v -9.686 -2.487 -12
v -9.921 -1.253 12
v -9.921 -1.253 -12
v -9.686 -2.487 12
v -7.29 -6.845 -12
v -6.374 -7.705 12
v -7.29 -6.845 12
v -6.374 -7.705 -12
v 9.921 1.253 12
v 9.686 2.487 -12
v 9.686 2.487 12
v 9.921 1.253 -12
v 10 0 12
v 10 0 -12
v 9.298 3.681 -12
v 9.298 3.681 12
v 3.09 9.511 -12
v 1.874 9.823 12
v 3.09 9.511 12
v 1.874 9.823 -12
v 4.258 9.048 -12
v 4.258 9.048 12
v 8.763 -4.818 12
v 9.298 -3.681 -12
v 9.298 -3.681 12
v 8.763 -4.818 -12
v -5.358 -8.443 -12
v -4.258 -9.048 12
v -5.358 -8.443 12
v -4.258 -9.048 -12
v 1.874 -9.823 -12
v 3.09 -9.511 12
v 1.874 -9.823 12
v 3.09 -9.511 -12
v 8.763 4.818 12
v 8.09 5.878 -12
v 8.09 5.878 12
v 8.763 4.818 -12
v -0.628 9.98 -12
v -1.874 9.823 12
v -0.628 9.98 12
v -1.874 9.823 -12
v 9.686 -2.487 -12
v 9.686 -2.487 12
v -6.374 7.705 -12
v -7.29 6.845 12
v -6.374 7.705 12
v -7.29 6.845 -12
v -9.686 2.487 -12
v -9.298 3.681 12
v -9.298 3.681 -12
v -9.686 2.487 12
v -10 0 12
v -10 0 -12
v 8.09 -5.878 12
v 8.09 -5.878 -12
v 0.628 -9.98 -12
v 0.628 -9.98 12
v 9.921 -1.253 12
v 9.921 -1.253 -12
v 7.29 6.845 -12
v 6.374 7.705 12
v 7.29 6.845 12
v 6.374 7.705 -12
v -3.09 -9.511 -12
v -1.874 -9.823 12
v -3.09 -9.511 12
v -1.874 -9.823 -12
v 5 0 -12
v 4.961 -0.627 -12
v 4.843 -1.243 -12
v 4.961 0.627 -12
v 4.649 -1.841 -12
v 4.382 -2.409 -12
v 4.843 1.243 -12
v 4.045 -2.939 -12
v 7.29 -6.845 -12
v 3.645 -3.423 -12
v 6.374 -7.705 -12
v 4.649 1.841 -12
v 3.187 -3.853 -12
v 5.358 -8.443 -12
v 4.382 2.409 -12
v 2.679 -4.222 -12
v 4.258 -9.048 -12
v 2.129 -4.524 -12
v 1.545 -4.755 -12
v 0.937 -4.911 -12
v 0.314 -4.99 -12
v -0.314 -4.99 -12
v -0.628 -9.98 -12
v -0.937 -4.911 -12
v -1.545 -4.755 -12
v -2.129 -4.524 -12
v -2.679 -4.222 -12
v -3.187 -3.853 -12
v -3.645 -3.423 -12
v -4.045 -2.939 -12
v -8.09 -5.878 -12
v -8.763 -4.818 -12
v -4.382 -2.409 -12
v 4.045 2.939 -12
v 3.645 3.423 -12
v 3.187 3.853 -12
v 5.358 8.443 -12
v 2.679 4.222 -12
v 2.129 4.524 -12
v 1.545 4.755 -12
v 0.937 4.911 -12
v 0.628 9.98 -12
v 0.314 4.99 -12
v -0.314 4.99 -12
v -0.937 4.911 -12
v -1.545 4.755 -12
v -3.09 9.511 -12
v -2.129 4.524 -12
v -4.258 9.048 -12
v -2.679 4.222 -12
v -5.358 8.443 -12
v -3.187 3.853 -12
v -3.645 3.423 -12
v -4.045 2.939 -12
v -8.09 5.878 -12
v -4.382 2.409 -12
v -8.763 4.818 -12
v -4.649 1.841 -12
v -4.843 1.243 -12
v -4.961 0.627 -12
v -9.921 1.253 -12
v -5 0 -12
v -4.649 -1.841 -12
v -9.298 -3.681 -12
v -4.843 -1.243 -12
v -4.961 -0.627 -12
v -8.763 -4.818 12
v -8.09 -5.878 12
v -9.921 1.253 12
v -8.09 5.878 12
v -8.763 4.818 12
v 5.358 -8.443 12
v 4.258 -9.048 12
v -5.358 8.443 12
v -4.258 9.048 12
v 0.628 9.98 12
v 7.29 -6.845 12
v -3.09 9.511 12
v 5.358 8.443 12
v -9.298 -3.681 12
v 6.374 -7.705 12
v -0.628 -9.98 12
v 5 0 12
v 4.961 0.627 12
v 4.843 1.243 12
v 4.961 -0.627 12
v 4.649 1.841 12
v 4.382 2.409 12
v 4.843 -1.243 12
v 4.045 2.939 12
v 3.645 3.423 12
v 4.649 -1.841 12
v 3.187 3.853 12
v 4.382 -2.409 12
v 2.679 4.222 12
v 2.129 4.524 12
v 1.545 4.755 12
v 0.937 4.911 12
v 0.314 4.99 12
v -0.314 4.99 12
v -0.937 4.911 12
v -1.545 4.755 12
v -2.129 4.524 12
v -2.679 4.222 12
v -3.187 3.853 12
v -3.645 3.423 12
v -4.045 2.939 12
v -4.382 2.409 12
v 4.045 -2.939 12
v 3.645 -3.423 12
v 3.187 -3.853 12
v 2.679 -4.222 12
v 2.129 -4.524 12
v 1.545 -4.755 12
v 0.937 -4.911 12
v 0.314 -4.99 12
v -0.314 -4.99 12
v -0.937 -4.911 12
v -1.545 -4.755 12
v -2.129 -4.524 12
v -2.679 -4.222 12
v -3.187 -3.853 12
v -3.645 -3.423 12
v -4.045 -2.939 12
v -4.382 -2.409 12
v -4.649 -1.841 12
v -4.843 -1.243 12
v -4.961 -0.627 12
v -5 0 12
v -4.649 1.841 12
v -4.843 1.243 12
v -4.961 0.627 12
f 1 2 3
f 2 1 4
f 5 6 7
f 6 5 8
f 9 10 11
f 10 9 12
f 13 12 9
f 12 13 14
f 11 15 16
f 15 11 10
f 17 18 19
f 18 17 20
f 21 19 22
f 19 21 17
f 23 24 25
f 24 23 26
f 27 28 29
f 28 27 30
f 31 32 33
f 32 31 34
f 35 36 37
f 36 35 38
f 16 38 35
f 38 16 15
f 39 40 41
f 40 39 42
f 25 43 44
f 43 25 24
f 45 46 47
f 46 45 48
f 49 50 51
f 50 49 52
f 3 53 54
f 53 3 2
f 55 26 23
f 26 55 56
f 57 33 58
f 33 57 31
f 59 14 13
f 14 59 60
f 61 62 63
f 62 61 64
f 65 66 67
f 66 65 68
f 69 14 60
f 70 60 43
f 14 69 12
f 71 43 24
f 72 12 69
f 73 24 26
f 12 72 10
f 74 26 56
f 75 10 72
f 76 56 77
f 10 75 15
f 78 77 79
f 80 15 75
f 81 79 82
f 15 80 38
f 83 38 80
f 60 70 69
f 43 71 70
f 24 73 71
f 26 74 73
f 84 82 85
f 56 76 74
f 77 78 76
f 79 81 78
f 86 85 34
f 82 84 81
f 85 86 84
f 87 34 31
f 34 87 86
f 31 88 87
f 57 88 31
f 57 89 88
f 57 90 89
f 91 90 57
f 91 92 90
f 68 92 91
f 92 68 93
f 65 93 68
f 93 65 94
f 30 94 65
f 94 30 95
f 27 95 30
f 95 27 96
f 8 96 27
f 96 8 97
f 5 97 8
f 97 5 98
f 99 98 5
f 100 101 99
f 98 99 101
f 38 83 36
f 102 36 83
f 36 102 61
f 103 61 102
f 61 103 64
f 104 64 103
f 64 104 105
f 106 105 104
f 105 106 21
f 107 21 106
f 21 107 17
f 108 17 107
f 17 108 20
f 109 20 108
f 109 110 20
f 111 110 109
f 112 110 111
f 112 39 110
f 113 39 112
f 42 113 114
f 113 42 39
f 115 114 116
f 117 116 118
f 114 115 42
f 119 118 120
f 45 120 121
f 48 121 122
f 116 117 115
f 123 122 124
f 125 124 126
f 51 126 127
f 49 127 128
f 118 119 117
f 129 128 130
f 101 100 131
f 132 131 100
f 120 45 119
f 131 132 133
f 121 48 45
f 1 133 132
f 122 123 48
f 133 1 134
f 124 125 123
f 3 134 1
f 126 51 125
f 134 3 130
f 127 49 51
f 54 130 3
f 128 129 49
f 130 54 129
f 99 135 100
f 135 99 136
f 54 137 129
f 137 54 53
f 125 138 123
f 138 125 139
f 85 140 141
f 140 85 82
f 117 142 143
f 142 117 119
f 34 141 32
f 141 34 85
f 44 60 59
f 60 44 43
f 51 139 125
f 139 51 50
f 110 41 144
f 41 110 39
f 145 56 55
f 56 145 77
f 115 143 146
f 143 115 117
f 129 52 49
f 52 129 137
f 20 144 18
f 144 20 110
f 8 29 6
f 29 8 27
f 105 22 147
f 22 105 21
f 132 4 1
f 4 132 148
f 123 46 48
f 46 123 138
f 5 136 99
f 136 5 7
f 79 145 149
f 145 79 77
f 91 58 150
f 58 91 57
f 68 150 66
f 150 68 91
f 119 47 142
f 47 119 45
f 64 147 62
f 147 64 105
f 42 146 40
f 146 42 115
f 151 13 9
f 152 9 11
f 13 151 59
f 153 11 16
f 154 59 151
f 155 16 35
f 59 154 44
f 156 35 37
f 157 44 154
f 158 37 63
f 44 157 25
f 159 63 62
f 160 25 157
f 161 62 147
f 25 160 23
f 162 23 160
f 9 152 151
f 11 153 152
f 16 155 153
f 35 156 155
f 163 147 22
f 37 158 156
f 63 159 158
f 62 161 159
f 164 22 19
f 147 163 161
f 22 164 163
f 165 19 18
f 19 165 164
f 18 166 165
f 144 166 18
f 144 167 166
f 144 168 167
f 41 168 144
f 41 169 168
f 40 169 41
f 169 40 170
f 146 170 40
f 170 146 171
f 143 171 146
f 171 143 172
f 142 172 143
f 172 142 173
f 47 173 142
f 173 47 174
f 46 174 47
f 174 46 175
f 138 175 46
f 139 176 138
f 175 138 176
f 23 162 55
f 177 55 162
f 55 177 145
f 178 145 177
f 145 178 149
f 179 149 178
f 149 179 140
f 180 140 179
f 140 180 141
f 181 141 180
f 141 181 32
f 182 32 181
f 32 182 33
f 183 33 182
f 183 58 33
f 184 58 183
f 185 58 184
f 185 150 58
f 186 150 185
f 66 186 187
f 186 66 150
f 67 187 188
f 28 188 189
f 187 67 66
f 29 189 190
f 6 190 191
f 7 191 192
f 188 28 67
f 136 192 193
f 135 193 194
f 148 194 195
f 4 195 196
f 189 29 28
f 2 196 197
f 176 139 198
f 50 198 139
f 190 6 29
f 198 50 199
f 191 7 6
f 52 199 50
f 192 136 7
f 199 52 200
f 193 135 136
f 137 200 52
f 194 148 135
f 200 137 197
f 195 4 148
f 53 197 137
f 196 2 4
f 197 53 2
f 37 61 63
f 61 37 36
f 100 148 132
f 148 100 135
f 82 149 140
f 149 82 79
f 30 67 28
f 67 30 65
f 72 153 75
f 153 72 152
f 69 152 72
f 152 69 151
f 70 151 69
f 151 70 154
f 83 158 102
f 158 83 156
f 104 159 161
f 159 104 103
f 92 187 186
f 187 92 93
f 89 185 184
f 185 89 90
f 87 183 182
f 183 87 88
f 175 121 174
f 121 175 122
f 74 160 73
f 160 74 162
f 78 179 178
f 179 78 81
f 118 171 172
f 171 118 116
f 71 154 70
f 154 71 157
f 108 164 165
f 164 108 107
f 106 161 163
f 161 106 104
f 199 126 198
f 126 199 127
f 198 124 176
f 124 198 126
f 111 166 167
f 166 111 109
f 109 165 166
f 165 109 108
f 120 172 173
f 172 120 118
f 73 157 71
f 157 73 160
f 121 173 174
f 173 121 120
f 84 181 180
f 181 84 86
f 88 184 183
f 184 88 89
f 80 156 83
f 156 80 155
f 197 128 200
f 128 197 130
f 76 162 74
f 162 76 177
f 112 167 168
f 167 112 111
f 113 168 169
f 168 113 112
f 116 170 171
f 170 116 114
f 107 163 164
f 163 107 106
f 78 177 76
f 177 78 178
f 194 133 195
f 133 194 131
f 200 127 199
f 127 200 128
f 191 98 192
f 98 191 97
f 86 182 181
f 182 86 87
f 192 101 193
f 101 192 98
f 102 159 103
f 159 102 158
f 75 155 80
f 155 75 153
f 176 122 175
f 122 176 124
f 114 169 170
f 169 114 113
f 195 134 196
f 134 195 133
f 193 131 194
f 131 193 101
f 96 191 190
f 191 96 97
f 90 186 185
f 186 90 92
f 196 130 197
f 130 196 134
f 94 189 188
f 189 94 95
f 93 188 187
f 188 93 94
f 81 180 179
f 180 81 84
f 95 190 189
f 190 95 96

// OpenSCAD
$fn = 50;


difference() {
	union() {
		translate(v = [0, 0, -12.0000000000]) {
			cylinder(h = 24, r = 10.0000000000);
		}
	}
	union() {
		translate(v = [0, 0, -100.0000000000]) {
			cylinder(h = 200, r = 5.0000000000);
		}
	}
}
